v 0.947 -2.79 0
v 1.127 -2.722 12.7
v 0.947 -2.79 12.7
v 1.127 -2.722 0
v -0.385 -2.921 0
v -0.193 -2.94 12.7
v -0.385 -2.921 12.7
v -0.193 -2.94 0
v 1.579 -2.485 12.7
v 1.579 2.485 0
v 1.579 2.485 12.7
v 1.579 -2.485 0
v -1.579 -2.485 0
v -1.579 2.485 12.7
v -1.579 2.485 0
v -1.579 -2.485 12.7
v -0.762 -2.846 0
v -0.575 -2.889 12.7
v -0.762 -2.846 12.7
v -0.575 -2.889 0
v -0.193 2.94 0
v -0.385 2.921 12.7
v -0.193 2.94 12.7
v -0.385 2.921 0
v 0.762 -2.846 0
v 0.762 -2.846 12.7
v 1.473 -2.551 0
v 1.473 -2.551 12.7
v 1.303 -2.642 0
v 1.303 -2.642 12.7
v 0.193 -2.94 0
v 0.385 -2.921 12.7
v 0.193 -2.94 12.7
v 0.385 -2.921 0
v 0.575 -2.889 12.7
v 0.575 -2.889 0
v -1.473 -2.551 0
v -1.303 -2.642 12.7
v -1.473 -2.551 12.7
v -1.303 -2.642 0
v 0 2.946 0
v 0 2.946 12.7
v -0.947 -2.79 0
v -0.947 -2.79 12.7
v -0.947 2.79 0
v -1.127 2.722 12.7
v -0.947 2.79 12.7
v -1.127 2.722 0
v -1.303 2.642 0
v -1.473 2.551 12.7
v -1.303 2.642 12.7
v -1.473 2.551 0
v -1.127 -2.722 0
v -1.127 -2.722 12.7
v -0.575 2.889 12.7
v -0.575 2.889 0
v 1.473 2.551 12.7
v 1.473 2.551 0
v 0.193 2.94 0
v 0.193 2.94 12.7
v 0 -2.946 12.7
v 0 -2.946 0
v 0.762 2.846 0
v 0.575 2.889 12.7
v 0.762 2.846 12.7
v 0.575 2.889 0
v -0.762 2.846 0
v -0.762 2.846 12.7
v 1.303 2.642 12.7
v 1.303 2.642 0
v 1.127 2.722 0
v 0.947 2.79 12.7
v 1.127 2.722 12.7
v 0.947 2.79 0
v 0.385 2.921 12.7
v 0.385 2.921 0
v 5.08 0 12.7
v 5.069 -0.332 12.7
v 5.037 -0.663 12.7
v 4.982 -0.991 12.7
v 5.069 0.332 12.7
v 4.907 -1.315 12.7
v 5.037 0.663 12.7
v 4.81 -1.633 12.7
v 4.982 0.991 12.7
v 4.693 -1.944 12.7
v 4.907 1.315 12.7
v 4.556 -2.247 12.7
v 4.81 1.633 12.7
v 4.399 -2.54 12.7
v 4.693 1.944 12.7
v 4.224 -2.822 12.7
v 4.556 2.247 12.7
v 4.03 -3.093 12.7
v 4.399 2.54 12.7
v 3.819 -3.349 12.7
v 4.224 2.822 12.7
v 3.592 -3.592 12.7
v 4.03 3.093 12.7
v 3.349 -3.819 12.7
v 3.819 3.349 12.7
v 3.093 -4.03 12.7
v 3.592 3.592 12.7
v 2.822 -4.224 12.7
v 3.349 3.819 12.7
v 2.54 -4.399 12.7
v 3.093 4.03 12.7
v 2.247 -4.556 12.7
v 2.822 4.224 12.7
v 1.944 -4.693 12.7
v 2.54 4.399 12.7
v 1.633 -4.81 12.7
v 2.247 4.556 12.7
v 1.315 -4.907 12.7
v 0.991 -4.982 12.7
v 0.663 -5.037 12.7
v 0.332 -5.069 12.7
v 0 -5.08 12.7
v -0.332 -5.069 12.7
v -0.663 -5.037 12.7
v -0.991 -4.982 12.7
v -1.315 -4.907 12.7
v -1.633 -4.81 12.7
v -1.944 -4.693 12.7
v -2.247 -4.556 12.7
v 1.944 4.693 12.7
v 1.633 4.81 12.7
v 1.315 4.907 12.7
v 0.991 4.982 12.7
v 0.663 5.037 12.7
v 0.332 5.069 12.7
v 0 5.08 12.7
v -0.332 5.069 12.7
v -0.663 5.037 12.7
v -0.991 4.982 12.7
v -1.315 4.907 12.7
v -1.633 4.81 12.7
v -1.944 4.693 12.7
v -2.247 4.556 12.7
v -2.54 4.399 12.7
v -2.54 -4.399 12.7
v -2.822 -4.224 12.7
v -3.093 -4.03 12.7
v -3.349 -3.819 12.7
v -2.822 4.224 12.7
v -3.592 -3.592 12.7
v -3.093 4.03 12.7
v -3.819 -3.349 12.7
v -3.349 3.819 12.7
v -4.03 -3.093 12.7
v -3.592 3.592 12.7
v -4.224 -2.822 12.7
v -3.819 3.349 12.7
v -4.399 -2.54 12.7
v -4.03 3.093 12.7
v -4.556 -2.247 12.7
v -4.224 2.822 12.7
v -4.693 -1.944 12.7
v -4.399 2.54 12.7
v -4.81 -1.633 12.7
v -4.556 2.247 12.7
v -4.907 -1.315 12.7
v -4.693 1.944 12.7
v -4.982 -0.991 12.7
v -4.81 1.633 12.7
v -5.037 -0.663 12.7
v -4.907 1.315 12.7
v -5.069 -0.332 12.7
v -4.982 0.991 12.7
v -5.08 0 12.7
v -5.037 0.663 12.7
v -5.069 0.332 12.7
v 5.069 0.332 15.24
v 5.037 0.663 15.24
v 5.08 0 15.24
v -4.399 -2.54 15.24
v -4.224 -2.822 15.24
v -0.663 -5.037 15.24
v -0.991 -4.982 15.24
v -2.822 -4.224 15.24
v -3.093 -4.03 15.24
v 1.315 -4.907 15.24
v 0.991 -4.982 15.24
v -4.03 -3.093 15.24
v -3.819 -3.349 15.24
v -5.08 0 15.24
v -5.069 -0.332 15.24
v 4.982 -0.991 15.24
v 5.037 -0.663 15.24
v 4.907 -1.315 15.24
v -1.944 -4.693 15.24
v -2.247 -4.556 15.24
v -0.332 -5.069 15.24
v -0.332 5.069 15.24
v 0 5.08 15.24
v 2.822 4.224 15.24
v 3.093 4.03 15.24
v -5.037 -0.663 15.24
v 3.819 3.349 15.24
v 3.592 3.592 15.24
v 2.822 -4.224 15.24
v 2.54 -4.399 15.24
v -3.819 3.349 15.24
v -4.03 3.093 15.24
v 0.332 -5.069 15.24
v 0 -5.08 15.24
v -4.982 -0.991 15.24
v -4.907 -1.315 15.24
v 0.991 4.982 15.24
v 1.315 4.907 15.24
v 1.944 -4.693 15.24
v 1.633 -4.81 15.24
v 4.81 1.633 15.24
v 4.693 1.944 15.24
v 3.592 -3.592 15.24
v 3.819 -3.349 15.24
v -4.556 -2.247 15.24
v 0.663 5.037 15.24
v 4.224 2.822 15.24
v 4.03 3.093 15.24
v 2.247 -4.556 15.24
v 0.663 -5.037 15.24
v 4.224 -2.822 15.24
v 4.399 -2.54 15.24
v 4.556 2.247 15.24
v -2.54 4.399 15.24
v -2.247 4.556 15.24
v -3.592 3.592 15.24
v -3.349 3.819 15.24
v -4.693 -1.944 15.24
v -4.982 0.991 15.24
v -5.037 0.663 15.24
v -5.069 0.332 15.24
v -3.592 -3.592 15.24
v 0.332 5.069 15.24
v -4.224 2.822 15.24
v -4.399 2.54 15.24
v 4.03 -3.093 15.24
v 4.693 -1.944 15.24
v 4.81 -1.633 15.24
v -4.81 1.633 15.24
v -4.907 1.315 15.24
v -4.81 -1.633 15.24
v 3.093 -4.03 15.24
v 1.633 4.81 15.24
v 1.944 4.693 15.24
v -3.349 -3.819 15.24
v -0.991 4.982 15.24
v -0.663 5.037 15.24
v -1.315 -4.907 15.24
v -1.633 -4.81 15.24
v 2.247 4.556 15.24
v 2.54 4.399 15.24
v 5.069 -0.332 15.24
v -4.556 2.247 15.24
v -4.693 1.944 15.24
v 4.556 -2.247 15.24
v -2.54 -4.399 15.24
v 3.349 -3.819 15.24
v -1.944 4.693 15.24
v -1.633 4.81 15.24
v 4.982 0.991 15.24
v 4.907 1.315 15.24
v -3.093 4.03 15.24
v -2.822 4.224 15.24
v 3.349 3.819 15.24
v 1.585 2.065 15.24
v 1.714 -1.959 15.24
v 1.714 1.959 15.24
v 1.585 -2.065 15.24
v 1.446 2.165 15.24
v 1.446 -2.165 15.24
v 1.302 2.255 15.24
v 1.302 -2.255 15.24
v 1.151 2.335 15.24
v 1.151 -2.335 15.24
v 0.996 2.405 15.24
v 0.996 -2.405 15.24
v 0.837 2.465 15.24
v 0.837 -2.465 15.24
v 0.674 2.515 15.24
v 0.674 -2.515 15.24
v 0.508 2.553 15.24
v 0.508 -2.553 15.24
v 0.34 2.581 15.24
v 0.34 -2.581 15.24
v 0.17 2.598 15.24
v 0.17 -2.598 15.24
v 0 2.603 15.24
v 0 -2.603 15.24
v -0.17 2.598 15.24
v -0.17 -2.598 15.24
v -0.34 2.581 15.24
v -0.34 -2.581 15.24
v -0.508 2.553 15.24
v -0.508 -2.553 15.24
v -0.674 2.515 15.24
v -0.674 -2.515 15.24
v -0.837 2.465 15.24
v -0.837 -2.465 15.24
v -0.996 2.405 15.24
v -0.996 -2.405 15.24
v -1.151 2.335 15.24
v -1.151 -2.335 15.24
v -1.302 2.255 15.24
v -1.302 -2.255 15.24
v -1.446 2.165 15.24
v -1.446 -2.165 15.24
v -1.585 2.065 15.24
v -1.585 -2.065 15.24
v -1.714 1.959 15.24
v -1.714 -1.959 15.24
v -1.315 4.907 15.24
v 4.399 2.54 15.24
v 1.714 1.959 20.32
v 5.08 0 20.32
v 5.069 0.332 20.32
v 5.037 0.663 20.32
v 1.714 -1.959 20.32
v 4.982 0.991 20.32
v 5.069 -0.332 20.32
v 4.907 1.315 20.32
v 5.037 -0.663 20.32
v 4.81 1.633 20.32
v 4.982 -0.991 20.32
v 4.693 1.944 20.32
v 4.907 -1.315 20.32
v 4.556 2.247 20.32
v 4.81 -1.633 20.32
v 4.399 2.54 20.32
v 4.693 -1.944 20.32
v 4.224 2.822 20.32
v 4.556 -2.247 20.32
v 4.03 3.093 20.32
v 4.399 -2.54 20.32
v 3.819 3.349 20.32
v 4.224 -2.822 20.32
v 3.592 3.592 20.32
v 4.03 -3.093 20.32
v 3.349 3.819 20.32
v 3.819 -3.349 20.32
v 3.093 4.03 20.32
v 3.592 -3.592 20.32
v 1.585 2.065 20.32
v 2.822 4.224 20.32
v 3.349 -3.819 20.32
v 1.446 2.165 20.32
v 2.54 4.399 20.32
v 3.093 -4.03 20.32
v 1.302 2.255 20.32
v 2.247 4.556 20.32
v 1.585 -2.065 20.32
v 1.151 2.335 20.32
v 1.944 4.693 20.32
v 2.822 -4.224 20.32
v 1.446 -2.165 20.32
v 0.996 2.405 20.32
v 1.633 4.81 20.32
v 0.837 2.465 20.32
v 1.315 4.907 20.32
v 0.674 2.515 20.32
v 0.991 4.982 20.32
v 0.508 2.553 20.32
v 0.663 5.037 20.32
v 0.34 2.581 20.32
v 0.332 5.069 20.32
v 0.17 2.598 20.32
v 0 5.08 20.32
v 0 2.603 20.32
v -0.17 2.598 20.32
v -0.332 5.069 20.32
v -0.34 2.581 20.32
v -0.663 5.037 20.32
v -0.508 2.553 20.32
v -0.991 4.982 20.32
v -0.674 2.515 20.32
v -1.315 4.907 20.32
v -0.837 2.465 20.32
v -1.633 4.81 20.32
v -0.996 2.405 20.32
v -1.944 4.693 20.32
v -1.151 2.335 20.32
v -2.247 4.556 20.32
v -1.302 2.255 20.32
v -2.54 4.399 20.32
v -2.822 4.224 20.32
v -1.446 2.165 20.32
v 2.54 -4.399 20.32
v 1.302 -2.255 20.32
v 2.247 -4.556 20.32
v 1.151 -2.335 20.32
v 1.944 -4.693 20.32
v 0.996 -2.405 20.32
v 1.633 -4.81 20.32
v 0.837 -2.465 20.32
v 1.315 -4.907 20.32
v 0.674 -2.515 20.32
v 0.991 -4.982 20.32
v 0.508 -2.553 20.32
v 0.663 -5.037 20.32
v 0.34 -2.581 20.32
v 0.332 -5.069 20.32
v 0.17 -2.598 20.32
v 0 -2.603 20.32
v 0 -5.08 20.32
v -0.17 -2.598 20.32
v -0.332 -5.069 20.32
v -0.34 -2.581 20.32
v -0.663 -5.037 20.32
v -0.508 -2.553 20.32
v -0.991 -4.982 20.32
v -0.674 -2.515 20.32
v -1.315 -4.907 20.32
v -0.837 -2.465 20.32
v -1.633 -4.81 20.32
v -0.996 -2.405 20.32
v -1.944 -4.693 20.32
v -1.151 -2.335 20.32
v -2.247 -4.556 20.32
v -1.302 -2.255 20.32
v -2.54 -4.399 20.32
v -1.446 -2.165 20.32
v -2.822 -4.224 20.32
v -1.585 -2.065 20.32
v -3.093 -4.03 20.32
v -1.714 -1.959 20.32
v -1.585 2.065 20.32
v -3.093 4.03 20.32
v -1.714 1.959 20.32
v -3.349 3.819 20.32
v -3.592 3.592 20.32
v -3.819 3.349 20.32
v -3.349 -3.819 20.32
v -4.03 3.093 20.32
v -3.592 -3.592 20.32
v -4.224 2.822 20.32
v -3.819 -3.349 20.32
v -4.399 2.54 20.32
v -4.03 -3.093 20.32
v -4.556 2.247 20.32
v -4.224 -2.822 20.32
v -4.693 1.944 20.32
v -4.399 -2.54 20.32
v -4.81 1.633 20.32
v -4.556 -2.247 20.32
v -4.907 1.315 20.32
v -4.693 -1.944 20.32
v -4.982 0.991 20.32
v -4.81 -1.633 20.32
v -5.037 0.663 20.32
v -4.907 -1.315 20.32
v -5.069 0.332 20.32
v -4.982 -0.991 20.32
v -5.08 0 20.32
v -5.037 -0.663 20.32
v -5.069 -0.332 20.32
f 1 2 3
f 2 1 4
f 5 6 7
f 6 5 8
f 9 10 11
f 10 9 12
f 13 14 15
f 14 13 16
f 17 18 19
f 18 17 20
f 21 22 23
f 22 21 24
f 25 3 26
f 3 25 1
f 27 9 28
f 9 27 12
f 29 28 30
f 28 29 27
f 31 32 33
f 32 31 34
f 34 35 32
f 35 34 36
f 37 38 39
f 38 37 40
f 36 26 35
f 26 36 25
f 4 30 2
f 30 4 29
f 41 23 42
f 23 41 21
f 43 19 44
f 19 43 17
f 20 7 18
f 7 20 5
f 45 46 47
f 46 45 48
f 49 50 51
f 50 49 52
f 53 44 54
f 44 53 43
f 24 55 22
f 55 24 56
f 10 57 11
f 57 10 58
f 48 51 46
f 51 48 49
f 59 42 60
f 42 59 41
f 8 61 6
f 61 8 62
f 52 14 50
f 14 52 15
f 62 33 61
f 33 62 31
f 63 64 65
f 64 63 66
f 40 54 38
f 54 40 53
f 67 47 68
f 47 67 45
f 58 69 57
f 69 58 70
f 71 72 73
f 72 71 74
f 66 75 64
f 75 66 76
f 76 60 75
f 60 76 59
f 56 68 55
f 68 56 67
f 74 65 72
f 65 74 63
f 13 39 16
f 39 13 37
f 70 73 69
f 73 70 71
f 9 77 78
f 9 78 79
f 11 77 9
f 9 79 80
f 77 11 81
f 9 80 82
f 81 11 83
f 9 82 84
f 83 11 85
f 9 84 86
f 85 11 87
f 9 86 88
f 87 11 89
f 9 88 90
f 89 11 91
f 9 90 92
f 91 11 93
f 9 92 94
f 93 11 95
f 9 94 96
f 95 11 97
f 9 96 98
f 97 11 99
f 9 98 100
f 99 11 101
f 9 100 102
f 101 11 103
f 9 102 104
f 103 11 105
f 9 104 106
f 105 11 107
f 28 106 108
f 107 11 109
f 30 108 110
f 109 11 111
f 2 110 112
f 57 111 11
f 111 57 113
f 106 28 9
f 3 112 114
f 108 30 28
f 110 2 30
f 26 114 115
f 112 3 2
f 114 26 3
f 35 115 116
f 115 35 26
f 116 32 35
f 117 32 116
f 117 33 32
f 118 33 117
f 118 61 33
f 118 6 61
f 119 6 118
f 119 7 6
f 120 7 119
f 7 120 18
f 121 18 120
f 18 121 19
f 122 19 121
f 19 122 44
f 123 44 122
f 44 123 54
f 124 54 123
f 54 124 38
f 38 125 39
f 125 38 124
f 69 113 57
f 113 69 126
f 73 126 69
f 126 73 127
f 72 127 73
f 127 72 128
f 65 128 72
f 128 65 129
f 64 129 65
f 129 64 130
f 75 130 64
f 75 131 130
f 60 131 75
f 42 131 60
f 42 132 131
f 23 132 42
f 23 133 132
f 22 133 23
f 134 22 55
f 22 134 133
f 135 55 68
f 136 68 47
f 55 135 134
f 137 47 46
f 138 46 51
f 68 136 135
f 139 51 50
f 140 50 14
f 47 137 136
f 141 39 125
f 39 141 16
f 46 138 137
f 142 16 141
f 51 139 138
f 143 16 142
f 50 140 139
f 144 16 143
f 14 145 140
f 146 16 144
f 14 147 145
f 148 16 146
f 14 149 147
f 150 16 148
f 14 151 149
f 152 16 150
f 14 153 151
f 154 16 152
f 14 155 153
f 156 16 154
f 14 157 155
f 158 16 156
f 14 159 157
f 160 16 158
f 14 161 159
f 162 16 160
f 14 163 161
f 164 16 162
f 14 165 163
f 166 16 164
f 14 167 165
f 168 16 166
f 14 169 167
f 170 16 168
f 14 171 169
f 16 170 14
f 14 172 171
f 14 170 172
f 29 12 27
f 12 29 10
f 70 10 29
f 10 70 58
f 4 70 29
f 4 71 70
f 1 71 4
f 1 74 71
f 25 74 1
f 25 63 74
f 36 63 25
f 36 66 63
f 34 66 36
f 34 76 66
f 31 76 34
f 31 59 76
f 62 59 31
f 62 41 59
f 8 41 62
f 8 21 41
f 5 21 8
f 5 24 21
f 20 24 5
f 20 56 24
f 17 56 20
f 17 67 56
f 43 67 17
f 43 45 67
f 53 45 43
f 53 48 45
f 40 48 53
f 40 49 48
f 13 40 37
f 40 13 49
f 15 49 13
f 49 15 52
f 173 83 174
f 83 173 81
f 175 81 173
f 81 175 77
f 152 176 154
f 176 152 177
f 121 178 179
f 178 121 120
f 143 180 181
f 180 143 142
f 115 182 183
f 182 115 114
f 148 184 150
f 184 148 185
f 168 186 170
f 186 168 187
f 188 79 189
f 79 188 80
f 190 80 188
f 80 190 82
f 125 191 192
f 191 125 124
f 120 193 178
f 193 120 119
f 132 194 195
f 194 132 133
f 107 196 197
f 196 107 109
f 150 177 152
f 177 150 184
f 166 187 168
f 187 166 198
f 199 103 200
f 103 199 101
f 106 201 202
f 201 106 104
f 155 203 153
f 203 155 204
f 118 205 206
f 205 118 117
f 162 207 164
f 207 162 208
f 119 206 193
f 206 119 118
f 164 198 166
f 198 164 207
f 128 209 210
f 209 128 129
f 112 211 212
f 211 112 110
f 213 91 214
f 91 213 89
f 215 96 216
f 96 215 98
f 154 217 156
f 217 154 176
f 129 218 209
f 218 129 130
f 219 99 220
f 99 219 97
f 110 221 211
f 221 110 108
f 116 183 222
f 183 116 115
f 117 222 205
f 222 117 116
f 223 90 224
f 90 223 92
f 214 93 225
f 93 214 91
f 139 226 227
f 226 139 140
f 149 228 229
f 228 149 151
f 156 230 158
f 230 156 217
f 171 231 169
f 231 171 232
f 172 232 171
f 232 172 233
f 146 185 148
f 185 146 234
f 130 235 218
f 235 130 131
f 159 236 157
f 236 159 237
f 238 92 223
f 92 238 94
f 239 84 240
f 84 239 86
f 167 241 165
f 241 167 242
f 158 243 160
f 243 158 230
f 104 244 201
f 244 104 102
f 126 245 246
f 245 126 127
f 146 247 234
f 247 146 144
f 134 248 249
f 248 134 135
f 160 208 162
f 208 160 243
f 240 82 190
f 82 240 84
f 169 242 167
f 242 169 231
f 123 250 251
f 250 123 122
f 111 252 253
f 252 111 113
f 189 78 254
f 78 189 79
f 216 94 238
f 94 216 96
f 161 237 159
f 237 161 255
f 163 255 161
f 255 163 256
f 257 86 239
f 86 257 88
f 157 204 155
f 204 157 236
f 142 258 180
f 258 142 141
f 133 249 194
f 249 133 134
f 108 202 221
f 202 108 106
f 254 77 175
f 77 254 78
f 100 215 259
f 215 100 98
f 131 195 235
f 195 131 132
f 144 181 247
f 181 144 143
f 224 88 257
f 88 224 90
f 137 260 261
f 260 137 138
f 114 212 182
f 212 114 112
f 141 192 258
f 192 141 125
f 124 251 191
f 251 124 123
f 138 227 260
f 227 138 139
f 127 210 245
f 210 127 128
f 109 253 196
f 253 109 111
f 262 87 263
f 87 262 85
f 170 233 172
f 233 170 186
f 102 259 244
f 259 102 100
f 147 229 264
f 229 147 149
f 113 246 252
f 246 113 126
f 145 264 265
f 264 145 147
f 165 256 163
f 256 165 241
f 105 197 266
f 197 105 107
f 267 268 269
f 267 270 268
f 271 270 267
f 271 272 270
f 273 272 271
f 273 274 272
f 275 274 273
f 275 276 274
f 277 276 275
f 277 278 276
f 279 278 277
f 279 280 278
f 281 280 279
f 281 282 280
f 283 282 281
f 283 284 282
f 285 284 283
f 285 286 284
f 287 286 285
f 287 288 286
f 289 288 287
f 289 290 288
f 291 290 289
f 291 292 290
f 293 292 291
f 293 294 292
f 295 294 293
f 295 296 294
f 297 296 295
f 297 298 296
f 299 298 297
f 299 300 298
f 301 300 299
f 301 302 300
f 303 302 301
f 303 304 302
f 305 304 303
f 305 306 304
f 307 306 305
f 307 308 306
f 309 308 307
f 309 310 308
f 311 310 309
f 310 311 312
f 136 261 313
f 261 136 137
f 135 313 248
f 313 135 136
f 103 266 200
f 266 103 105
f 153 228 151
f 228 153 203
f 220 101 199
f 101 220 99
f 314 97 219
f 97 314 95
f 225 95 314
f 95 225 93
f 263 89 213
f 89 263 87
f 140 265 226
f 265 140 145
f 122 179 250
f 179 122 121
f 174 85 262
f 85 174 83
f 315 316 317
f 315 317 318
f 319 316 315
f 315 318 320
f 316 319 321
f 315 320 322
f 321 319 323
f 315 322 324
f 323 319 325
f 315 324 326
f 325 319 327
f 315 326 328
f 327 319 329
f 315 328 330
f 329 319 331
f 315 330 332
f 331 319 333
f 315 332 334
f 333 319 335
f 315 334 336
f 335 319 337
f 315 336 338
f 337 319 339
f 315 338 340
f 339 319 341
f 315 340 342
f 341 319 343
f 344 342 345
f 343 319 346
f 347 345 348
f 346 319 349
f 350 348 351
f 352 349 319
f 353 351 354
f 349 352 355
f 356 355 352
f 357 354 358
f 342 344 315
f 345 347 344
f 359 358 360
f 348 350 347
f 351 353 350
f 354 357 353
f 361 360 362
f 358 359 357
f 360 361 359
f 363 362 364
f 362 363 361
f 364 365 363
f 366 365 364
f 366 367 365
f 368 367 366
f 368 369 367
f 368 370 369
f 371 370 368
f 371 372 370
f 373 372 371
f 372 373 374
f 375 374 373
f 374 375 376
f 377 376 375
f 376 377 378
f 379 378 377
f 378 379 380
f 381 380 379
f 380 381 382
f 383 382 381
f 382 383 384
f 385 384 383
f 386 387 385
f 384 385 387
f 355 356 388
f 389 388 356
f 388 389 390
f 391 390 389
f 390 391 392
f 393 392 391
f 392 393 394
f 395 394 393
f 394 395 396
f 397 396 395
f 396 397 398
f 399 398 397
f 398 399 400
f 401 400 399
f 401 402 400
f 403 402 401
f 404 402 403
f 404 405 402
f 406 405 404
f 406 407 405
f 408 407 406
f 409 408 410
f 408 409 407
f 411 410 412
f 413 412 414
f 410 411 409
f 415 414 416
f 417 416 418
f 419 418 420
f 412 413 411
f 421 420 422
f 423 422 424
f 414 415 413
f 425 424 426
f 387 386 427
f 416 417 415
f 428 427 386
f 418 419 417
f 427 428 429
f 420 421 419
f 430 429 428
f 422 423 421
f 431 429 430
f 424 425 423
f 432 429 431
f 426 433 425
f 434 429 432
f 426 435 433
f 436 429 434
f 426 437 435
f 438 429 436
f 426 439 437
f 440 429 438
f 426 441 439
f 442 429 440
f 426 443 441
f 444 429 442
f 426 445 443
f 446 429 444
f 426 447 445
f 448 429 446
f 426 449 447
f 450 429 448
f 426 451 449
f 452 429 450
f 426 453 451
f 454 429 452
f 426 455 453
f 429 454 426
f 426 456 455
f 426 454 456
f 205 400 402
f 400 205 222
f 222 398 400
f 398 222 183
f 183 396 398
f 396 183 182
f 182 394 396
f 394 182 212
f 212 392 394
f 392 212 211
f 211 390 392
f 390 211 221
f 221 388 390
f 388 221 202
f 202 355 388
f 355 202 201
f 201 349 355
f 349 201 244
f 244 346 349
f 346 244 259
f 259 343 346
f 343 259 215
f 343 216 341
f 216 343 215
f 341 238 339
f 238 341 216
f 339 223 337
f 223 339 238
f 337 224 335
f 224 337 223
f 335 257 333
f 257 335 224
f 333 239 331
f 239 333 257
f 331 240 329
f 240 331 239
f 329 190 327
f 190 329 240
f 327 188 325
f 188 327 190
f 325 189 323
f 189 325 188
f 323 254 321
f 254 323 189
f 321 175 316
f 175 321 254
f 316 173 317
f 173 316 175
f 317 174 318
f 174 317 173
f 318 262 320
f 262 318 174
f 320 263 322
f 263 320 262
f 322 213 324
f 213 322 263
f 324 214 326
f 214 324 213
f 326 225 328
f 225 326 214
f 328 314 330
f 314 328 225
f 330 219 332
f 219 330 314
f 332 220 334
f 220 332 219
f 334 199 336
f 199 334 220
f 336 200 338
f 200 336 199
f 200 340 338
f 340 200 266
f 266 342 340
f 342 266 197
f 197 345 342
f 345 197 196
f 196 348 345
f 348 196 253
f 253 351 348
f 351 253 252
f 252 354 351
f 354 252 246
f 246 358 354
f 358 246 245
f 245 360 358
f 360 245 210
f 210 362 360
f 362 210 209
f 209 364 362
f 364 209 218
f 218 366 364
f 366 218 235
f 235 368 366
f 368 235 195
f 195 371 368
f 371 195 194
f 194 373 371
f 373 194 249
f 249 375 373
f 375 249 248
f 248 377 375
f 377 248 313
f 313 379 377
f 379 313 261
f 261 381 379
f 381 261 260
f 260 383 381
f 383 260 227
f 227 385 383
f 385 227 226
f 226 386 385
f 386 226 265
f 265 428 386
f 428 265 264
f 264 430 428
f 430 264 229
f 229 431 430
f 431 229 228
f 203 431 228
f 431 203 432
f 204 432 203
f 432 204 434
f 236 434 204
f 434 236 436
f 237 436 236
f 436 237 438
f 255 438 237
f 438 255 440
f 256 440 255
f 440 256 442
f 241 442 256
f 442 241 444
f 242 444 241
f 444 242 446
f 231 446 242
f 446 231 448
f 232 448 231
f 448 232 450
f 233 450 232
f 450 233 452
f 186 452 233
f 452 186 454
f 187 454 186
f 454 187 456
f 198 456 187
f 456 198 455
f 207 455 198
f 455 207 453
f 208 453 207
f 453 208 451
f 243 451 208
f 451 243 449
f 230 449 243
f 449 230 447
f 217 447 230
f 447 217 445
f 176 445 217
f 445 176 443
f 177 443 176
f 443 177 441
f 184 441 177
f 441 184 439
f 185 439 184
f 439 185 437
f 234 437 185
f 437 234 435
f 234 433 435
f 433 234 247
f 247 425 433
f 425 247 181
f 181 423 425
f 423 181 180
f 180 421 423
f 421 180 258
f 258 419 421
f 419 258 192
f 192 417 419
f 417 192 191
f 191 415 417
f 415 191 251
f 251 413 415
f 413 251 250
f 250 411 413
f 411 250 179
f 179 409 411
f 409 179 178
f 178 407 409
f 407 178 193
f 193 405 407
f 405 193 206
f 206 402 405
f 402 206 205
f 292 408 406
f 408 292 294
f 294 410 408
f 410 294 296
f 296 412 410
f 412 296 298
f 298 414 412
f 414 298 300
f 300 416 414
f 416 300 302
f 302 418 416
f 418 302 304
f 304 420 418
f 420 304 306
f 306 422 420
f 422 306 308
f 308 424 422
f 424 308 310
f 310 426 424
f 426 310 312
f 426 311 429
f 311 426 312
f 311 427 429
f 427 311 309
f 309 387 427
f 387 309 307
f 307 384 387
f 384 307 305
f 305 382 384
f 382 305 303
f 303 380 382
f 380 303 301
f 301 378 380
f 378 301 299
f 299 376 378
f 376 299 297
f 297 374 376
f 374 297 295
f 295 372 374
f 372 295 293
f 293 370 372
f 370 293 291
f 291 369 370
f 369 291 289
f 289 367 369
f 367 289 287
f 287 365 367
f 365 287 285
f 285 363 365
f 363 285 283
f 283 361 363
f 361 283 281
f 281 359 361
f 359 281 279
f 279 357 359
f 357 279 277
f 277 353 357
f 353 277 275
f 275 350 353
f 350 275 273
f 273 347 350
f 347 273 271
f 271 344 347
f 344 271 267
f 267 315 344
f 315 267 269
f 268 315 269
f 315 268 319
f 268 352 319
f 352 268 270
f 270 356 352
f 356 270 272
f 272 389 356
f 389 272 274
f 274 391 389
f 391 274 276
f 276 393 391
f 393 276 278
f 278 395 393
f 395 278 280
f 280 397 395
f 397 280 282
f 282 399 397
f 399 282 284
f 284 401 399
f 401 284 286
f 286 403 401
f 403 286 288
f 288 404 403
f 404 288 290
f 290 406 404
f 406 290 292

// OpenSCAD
ViewScale = [0.0254, 0.0254, 0.0254];

dsunhole = 6.4/25.4*1000;
cutoff = dsunhole/sqrt(2);

//module gearMotorInsert()
//{
//    difference() {
//        circle(200, $fn=96);
//        intersection() {
//            circle(70, $fn=96);
//            translate([20, 0, 0])
//            square([140, 200], center=true);
//        }
//    }
//}

module stepperInsert()
{
    difference() {
        circle(200, $fn=96);
        intersection() {
            circle(205/2, $fn=96);
            square([135, 400], center=true);
        }
    }
}
module gearsetShaft()
{
    difference() {
    circle(dsunhole/2-10, $fn=96);
    translate([cutoff+10, 0, 0])
    square(dsunhole, dsunhole, center = true);
    rotate([0, 0, 180])
    translate([cutoff+10, 0, 0])
    square(dsunhole, dsunhole, center = true);
    }

}

scale(ViewScale)
{
    linear_extrude(500)
    gearsetShaft();

    translate([0, 0, 500])
    linear_extrude(100)
    circle(200, $fn=96);


    translate([0, 0, 600])
    linear_extrude(200)
    stepperInsert();
}
